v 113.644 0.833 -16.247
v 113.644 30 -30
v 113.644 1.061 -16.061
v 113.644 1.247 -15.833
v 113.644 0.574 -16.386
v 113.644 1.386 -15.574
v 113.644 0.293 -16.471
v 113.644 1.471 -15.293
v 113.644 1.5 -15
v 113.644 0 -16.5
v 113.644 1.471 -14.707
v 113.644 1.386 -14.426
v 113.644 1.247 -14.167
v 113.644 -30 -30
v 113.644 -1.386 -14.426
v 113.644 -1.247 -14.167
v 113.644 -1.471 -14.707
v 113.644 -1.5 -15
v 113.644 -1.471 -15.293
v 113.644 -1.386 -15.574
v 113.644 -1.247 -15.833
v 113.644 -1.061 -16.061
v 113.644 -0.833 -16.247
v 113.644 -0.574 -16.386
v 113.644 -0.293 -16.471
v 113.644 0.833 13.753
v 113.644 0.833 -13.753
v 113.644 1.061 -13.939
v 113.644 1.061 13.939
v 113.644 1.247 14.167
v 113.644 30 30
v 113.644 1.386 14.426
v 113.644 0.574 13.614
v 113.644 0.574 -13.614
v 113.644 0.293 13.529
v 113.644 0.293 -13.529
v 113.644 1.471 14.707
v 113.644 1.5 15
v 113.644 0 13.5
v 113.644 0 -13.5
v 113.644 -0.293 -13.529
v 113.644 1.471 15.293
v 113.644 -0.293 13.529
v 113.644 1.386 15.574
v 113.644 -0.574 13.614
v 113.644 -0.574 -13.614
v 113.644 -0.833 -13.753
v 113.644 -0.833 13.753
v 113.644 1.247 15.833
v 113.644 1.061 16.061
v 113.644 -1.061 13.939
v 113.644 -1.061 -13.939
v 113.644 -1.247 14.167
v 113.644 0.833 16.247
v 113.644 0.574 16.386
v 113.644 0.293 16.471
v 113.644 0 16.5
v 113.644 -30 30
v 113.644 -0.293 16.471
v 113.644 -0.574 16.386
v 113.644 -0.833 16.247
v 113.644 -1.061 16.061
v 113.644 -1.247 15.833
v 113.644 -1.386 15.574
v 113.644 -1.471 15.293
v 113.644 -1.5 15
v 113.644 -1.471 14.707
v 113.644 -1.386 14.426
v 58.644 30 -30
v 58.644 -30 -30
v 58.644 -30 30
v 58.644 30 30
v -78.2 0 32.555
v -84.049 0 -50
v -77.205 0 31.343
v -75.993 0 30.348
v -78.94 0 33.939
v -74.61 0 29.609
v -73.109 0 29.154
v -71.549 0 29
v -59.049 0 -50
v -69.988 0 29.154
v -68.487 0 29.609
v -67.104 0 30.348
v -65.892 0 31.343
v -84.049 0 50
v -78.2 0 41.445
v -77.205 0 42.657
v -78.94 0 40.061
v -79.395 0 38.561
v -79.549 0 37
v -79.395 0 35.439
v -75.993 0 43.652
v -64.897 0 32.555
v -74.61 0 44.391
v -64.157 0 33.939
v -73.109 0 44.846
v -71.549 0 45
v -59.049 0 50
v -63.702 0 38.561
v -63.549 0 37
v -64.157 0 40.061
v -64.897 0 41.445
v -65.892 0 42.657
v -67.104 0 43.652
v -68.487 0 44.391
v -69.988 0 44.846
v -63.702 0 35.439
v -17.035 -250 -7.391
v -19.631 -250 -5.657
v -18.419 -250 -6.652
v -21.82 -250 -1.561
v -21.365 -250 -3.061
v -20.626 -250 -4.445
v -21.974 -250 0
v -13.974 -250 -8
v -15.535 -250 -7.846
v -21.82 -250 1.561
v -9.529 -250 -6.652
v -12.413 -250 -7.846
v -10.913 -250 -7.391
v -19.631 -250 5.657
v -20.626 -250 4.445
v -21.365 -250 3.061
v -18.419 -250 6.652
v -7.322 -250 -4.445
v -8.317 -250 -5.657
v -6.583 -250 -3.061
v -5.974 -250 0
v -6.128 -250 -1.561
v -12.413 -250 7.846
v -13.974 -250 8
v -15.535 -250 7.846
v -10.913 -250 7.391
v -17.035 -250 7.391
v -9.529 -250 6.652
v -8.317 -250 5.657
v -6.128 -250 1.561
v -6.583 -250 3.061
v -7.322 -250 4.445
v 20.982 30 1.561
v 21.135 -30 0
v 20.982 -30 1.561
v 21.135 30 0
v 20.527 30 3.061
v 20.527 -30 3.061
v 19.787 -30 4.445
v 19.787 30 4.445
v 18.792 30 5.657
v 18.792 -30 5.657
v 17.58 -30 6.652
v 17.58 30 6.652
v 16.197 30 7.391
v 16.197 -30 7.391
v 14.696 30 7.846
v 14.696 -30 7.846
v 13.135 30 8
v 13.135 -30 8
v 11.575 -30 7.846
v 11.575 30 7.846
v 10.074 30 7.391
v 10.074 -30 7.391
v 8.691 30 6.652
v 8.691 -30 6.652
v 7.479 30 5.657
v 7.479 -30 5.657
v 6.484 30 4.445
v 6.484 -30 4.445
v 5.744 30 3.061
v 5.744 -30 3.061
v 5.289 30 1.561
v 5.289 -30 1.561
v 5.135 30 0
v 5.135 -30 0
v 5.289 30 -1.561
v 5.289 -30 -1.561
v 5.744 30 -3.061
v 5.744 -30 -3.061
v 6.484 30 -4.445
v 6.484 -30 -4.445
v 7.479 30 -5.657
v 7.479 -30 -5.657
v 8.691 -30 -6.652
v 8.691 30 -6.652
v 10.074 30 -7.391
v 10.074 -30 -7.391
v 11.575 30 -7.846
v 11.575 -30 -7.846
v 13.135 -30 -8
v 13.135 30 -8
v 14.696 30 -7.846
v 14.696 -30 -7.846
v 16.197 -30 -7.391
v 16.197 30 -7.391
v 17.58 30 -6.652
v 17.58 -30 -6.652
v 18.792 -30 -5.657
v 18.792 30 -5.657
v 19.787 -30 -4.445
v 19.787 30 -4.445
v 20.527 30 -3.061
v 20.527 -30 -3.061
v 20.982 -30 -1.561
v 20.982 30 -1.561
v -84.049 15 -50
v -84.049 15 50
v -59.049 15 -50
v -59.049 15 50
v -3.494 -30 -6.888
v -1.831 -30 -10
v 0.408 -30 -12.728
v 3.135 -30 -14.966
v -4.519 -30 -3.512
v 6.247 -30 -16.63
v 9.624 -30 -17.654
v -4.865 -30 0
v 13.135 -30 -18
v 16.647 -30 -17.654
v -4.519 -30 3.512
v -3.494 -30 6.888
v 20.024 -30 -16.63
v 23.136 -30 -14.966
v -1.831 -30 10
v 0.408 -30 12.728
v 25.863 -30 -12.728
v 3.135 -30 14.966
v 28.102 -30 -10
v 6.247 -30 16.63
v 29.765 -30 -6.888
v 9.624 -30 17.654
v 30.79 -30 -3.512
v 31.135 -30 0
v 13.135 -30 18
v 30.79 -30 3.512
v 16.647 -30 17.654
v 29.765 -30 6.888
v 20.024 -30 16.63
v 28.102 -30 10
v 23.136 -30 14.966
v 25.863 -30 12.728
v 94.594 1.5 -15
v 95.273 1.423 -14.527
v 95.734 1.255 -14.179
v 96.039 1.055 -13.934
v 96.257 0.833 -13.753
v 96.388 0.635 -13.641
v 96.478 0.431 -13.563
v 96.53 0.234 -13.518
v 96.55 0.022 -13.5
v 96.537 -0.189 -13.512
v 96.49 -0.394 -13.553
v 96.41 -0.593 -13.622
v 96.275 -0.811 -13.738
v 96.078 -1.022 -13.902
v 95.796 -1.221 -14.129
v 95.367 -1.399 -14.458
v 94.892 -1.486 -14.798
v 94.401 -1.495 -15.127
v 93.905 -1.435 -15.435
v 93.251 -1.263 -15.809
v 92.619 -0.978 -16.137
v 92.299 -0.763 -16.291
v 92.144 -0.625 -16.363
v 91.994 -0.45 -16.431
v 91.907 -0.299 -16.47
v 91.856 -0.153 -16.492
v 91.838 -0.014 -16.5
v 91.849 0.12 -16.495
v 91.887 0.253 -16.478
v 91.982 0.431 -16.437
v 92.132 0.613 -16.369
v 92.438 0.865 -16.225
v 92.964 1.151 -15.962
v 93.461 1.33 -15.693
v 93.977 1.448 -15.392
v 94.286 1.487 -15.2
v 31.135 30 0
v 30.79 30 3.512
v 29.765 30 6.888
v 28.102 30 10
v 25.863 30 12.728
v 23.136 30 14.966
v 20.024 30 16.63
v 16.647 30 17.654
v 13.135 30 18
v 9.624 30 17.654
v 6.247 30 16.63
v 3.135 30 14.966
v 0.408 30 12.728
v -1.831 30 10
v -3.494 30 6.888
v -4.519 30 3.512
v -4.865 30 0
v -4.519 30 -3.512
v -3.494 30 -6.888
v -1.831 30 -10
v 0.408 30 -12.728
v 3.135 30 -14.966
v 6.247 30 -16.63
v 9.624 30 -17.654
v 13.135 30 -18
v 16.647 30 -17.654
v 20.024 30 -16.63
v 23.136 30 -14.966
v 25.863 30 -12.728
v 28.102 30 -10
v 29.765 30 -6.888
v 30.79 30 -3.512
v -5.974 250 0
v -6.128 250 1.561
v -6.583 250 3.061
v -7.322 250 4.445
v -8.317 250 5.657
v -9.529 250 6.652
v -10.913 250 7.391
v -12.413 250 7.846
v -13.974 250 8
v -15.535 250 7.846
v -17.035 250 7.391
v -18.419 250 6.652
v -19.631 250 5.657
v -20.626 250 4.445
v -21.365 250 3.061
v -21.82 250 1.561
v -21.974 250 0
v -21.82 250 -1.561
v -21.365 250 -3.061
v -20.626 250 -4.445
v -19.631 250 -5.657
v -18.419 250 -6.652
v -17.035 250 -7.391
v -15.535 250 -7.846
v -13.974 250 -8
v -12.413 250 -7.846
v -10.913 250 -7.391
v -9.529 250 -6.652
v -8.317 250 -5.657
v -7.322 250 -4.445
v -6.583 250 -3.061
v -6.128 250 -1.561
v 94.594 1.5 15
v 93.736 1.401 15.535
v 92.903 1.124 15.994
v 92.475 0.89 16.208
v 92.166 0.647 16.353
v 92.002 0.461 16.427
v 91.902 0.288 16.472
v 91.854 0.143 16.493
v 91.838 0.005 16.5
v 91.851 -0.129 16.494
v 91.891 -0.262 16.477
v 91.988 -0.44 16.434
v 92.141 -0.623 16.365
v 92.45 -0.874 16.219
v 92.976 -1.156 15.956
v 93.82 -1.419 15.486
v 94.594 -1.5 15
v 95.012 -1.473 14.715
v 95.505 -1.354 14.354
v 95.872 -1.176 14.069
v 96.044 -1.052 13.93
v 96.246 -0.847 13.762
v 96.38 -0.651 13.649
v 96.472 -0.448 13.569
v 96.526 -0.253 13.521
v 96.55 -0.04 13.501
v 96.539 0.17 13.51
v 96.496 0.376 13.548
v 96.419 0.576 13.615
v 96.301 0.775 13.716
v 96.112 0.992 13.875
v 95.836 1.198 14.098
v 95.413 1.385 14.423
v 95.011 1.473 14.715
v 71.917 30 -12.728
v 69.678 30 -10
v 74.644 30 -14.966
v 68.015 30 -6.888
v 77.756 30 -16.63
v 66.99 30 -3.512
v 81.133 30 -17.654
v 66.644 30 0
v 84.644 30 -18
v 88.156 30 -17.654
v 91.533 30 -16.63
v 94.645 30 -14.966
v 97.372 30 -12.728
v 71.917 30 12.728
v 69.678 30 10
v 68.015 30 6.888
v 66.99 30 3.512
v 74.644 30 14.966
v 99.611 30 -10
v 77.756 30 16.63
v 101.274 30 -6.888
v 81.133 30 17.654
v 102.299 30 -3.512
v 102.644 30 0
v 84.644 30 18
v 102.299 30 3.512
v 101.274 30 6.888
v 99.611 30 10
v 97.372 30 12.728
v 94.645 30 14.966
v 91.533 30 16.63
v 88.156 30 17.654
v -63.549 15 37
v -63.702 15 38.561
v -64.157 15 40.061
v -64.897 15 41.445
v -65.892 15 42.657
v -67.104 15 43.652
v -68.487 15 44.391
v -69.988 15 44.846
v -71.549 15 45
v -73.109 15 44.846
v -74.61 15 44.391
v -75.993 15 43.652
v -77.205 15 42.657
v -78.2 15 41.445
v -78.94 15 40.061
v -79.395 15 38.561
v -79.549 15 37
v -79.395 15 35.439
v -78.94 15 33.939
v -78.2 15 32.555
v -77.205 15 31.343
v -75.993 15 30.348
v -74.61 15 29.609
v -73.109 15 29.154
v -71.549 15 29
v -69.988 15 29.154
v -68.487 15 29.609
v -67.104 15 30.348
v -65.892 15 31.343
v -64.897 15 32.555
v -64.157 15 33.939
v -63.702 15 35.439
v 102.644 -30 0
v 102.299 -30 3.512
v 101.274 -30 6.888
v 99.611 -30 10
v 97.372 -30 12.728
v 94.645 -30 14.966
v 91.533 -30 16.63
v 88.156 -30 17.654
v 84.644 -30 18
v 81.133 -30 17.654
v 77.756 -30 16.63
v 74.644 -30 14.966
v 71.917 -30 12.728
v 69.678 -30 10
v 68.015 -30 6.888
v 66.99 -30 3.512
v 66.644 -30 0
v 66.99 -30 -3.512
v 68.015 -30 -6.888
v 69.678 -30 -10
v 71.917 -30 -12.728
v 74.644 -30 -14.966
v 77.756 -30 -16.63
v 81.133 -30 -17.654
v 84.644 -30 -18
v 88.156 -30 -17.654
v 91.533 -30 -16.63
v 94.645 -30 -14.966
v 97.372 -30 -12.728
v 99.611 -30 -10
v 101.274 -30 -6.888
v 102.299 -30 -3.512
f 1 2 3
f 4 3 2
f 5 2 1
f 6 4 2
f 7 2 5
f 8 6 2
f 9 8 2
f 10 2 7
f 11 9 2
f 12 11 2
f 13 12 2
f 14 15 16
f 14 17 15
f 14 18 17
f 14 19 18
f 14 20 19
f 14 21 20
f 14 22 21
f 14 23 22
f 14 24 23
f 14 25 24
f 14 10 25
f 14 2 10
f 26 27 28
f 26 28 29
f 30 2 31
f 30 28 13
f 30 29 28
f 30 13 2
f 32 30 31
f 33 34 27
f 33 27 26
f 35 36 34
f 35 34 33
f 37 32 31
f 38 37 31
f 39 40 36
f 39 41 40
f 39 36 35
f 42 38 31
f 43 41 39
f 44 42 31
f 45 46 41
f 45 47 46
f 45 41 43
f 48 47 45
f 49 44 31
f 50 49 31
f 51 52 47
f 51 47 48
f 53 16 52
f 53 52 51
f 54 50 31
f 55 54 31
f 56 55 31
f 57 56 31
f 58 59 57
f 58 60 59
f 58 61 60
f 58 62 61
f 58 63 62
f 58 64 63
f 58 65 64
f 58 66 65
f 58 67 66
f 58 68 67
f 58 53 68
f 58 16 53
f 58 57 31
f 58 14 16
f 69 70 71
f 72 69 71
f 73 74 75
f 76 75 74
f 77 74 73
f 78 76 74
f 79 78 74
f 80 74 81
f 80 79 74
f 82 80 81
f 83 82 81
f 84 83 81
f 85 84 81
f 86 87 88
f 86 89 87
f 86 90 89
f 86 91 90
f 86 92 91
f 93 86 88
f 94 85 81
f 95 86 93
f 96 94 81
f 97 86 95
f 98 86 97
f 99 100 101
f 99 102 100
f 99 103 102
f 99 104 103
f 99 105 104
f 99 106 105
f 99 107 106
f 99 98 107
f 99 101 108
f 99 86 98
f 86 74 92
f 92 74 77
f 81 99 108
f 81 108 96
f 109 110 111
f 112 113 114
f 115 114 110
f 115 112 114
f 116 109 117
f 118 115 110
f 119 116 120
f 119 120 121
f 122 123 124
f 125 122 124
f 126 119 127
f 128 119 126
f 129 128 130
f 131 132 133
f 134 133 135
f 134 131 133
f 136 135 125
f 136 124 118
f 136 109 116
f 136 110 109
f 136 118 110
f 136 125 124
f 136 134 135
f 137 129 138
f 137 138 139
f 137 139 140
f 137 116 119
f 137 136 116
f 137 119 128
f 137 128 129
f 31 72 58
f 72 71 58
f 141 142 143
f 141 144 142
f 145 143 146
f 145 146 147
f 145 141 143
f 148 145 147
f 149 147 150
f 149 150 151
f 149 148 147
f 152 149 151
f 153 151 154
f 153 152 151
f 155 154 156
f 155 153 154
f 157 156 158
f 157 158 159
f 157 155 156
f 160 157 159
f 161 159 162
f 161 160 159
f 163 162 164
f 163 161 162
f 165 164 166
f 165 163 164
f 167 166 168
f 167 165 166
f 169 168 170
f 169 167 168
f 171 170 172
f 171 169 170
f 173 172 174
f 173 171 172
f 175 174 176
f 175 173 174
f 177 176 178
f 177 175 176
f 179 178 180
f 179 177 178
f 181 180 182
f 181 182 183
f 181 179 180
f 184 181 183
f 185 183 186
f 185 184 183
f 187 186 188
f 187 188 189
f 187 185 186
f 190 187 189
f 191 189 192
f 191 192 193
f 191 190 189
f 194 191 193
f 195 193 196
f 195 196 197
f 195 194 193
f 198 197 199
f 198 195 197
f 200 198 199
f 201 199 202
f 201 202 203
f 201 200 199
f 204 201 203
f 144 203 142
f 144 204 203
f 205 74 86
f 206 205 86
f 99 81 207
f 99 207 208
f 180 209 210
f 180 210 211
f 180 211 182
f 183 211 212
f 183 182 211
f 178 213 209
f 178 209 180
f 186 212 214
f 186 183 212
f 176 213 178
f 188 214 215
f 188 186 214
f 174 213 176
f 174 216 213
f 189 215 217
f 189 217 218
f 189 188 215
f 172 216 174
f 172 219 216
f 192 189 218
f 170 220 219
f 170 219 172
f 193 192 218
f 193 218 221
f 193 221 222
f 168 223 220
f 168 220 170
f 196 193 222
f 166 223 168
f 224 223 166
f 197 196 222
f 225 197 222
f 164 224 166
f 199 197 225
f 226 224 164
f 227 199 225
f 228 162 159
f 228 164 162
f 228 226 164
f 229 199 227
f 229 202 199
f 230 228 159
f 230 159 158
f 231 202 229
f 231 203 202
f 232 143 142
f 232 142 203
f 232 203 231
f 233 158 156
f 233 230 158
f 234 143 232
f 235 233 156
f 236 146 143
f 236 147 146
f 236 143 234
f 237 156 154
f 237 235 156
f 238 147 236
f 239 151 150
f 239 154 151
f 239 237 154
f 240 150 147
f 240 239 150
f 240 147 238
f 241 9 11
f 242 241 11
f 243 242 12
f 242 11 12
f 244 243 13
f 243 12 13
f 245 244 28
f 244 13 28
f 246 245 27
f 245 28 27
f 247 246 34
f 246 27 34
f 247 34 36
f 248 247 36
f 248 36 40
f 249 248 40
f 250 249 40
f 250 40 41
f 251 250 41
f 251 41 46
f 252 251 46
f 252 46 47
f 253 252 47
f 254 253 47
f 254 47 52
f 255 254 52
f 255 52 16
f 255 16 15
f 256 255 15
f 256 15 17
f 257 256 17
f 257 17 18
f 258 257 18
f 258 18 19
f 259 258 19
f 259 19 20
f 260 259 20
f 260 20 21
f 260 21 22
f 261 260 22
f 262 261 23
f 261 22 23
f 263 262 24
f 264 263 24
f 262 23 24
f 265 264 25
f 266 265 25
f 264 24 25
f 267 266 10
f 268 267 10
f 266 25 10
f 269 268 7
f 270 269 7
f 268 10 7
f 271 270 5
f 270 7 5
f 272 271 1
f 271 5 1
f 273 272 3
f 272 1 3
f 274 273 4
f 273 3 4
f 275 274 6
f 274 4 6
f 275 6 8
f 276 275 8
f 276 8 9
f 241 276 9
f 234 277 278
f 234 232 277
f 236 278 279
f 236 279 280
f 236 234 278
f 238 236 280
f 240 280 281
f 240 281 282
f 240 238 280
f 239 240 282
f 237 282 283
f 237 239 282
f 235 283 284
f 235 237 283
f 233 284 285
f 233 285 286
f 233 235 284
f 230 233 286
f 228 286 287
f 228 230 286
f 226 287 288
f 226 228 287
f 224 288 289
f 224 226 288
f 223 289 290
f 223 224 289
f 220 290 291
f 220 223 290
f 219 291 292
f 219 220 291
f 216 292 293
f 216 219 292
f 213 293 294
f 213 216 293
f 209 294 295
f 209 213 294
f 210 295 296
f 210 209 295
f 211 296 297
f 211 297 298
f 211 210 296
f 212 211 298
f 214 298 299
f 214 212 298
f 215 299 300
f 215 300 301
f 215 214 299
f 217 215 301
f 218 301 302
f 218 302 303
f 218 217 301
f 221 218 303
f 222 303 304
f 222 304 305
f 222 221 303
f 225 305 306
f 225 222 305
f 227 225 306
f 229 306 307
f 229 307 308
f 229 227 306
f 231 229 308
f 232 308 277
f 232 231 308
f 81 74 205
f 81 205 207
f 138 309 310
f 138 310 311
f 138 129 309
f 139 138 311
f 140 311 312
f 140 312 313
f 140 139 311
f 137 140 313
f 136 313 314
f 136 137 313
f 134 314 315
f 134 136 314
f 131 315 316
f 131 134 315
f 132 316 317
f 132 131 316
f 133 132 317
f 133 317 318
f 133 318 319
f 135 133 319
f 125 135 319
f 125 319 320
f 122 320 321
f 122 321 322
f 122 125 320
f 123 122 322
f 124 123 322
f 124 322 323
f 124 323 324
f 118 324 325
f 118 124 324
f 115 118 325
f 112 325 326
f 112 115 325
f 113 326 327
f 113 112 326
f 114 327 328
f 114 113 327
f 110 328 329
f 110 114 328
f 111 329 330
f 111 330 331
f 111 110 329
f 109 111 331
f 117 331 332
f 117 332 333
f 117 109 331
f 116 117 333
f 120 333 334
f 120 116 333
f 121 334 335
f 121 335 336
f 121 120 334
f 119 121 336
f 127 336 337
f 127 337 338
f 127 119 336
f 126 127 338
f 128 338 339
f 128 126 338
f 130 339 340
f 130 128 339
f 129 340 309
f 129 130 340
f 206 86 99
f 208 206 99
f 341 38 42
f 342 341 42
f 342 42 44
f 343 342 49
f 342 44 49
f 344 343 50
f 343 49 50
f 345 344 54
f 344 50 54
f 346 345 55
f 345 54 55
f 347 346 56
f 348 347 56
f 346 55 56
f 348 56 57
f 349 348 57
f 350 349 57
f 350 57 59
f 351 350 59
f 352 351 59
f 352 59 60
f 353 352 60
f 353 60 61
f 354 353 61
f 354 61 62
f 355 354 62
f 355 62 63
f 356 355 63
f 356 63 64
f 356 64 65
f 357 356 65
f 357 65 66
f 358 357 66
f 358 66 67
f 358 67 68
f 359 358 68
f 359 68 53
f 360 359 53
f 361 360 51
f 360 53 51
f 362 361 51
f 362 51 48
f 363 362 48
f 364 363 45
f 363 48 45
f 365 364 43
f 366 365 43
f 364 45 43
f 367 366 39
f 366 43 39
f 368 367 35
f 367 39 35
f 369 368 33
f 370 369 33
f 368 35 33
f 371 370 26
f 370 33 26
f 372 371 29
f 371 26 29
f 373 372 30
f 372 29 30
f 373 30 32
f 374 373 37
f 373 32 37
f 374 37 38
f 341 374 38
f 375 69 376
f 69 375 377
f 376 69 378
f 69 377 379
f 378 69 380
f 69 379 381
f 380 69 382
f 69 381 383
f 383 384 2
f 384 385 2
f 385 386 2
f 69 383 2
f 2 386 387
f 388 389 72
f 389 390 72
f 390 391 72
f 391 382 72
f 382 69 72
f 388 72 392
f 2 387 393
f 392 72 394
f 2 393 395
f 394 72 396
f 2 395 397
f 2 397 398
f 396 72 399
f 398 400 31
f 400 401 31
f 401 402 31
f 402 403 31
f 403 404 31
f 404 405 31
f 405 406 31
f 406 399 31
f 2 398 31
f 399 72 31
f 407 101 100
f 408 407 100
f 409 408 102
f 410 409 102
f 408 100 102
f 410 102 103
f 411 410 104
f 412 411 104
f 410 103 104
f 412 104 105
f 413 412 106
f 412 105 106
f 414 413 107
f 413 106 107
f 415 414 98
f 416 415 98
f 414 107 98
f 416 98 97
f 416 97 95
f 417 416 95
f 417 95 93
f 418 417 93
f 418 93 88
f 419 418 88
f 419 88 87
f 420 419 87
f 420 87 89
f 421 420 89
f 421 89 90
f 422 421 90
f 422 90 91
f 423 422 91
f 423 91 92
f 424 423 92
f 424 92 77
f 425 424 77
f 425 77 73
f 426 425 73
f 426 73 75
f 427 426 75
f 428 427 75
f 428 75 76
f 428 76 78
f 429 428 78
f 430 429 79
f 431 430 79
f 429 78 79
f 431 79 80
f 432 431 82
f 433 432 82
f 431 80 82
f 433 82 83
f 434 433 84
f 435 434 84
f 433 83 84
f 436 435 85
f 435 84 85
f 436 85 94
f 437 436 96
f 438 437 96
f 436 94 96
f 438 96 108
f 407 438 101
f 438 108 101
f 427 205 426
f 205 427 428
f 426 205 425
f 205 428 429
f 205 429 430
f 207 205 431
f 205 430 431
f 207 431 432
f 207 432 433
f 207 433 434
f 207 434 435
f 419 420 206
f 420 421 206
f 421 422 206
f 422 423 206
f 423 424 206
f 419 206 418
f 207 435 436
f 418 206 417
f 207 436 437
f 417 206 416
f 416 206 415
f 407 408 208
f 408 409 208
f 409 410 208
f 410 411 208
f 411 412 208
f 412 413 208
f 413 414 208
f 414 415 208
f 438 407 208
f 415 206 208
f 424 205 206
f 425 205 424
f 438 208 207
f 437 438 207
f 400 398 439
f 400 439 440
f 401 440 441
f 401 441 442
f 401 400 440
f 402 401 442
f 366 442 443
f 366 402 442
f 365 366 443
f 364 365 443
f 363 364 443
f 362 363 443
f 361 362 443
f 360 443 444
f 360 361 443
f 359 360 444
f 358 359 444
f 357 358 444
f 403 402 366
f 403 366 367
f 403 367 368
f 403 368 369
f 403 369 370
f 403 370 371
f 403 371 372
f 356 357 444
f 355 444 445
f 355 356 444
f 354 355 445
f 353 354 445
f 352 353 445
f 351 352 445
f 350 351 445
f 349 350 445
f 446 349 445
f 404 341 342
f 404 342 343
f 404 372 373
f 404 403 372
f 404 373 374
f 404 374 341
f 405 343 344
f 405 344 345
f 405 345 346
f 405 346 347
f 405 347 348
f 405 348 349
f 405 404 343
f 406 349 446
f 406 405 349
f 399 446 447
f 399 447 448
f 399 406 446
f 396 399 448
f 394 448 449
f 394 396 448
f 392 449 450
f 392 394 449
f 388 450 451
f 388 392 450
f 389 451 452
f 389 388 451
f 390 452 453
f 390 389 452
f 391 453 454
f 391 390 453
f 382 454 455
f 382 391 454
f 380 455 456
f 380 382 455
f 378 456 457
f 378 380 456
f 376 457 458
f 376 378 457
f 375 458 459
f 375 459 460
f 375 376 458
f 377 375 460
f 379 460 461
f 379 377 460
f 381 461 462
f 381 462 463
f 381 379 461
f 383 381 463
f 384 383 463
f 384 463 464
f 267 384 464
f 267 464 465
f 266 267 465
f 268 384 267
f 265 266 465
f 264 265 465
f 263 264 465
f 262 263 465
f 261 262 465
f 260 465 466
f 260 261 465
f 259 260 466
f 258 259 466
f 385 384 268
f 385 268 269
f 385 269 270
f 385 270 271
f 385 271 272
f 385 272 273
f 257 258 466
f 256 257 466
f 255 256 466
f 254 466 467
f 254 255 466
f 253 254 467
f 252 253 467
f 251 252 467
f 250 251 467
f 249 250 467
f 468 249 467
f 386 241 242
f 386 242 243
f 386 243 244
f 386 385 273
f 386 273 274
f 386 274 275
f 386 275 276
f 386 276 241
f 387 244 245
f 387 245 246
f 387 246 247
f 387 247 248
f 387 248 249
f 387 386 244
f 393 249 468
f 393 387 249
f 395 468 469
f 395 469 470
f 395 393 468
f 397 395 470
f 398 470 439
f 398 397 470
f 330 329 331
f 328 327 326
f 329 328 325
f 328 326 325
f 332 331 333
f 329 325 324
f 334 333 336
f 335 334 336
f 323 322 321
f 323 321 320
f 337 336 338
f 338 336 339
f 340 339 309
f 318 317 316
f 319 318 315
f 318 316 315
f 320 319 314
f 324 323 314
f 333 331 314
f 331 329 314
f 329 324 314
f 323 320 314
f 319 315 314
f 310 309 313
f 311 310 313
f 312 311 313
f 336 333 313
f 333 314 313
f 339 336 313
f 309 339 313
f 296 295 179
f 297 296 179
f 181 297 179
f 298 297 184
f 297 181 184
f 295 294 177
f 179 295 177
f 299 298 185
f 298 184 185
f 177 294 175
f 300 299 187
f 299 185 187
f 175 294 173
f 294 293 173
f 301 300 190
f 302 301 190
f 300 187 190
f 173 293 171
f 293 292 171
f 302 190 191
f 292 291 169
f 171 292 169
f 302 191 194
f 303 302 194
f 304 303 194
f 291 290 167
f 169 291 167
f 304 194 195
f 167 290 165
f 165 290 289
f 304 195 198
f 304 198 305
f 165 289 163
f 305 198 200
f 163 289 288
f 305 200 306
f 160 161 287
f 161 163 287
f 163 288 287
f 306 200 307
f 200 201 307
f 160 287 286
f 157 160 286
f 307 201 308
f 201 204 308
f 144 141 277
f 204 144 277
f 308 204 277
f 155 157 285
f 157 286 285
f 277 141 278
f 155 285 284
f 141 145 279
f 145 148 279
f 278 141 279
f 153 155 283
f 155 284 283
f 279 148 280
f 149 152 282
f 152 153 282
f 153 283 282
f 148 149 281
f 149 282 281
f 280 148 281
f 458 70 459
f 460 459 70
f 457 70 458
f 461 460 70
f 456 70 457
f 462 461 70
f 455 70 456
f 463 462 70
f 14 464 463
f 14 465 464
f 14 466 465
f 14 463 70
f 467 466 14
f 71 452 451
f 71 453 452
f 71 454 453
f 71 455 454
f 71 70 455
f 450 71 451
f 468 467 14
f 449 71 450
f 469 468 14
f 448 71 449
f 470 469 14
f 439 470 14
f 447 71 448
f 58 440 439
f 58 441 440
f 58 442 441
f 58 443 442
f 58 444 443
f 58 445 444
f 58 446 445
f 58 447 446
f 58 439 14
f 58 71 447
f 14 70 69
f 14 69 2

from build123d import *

# Parameters (mm, degrees)
F0_R      = 8
F1_DEPTH  = 250
F2_R      = 18
F2_R_2    = 8
F3_DEPTH  = 30
F4_W      = 25
F4_H      = 100
F5_DEPTH  = 15
F6_R      = 8
F7_DEPTH  = 25
F8_W      = 55
F8_H      = 60
F8_R      = 18
F9_DEPTH  = 30
F10_R     = 1.5
F11_DEPTH = 25


with BuildPart() as f1:
    # F0 (on Front) → F1 (new body, symmetric)
    with BuildSketch(Plane.XZ):
        with Locations((-13.974002, 0)):
            Circle(F0_R)
    extrude(amount=F1_DEPTH, both=True)


with BuildPart() as f3:
    # F2 (on Front) → F3 (new body, symmetric)
    with BuildSketch(Plane.XZ):
        with Locations((13.135484, 0)):
            Circle(F2_R)
        with Locations((13.135484, 0)):
            Circle(F2_R_2, mode=Mode.SUBTRACT)
    extrude(amount=F3_DEPTH, both=True)


with BuildPart() as f5:
    # F4 (on Front) → F5 (new body)
    with BuildSketch(Plane.XZ):
        with Locations((-71.548517, 0)):
            Rectangle(F4_W, F4_H)
    extrude(amount=-F5_DEPTH)

    # F6 (on face) → F7 (cut)
    with BuildSketch(Plane.XZ):
        with Locations((-71.548517, 37)):
            Circle(F6_R)
    extrude(amount=-F7_DEPTH, mode=Mode.SUBTRACT)


with BuildPart() as f9:
    # F8 (on Front) → F9 (new body, symmetric)
    with BuildSketch(Plane.XZ):
        with Locations((86.14445, 0)):
            Rectangle(F8_W, F8_H)
        with Locations((84.64445, 0)):
            Circle(F8_R, mode=Mode.SUBTRACT)
    extrude(amount=F9_DEPTH, both=True)

    # F10 (on face) → F11 (cut)
    with BuildSketch(Plane.YZ.offset(113.64445)):
        with Locations((0, 15)):
            Circle(F10_R)
        with Locations((0, -15)):
            Circle(F10_R)
    extrude(amount=-F11_DEPTH, mode=Mode.SUBTRACT)


solid = Compound([f1.part, f3.part, f5.part, f9.part])
